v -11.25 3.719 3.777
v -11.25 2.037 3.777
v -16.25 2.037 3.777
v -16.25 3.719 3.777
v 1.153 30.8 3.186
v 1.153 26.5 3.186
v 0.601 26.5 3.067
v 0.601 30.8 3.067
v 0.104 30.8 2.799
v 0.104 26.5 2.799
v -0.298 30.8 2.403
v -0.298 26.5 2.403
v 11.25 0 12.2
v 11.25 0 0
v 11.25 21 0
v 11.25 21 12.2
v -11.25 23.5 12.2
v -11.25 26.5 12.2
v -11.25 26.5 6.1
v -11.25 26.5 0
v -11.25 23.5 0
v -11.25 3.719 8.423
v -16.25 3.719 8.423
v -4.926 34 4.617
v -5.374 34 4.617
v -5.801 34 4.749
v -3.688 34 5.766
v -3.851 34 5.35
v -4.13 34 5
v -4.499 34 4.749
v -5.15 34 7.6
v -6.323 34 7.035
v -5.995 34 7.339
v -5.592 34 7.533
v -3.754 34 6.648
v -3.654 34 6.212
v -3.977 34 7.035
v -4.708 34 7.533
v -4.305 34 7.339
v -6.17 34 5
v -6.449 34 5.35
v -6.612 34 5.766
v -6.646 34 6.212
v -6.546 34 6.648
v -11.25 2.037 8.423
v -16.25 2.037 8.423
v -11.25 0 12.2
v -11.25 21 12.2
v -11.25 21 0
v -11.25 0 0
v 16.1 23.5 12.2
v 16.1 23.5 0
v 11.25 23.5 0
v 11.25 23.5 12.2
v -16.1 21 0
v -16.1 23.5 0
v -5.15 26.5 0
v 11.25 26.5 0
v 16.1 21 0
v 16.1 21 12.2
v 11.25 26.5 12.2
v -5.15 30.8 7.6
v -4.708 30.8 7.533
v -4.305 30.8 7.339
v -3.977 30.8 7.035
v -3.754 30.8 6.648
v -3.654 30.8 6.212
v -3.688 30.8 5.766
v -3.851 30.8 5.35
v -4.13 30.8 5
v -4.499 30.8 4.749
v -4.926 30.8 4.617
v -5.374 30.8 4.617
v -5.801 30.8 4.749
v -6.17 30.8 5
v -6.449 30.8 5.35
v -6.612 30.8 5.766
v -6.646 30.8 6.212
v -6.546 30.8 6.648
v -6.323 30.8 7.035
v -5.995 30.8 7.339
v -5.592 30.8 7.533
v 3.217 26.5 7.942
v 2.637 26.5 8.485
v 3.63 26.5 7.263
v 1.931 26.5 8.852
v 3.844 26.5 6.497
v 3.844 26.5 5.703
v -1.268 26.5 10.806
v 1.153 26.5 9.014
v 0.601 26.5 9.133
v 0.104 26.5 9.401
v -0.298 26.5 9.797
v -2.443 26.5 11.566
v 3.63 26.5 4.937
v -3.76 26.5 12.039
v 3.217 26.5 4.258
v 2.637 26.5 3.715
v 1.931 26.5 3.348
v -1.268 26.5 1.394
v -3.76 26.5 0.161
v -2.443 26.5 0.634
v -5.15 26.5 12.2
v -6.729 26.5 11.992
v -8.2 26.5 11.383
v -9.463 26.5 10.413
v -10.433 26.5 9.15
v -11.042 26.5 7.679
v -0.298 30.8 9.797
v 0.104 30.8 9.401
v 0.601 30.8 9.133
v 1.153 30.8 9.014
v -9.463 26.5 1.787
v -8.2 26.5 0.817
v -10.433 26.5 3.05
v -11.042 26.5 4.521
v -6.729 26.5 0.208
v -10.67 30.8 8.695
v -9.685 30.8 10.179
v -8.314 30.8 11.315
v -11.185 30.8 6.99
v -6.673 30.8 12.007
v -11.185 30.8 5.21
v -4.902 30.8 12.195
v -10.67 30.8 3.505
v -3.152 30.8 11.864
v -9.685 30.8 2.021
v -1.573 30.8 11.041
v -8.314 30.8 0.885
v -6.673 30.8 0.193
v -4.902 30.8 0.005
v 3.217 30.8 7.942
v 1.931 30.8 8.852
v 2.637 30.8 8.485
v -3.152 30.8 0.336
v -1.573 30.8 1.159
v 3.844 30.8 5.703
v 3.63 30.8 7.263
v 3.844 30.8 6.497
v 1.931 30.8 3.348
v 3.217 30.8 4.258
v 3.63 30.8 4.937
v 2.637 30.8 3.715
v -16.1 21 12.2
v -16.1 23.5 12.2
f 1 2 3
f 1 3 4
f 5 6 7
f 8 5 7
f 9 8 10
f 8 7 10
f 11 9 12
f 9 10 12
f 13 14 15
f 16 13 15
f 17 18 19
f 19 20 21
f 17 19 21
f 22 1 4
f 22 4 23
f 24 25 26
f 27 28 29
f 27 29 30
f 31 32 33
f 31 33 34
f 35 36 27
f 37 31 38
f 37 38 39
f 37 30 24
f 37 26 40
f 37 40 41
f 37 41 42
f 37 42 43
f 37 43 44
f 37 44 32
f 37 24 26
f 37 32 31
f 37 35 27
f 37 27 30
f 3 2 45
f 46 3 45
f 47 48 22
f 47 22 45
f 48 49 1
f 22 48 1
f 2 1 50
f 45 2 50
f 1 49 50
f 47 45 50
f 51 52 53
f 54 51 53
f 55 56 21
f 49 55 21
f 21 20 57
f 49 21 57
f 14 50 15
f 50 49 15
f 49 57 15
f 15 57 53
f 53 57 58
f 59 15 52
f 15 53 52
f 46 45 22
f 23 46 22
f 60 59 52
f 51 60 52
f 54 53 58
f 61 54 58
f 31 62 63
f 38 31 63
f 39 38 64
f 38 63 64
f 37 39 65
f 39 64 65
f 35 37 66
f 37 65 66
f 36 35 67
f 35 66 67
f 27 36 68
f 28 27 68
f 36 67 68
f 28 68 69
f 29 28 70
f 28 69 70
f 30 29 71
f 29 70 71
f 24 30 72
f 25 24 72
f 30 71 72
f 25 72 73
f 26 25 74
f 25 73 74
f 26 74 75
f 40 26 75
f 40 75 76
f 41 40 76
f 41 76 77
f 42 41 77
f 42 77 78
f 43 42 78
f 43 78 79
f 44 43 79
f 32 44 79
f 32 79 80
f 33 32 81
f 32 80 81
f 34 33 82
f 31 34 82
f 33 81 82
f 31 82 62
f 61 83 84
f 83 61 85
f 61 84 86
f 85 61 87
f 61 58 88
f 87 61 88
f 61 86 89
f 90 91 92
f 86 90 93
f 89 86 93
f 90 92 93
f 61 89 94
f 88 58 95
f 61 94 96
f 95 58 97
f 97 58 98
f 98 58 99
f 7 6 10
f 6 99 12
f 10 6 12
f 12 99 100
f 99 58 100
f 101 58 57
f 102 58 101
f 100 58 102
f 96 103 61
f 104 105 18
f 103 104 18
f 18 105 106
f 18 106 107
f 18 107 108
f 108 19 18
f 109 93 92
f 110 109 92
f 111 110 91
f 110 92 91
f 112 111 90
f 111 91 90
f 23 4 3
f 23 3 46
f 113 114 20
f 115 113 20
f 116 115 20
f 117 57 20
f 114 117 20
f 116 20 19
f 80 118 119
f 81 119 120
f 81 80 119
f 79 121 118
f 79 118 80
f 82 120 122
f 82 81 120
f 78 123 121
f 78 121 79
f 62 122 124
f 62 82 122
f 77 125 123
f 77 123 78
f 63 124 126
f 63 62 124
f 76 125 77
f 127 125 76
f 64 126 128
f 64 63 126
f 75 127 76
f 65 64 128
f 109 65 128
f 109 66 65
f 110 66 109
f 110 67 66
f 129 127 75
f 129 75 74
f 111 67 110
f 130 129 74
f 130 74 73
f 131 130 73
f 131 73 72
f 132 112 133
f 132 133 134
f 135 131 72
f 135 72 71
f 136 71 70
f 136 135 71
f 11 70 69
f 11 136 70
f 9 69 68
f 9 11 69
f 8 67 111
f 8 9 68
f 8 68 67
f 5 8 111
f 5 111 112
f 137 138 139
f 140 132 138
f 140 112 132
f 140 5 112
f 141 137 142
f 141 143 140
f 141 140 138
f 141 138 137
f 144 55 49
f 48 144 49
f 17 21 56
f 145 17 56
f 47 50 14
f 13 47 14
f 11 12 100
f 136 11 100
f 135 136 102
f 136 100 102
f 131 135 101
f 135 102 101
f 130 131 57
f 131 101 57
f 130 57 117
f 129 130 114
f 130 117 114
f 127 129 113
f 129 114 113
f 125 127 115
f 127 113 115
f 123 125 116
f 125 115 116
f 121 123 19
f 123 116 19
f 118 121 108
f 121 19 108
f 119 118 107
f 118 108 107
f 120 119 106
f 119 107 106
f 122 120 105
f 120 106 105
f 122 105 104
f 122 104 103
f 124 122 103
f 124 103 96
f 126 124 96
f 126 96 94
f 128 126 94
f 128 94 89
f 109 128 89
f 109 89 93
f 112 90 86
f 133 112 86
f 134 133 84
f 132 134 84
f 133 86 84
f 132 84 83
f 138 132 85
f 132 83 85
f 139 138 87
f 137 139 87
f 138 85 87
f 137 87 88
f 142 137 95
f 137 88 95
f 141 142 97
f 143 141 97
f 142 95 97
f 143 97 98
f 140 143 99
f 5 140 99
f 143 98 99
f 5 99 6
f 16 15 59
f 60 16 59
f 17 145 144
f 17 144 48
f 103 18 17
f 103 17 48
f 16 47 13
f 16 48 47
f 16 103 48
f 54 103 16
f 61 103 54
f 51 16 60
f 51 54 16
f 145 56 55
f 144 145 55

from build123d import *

# Parameters (mm, degrees)
BOSS_EXTRUDE1_DEPTH = 12.2
BOSS_EXTRUDE2_DEPTH = 4.3
SKETCH3_R           = 1.5
BOSS_EXTRUDE3_DEPTH = 3.2
SKETCH4_W           = 4.645747774
SKETCH4_H           = 1.682483887
BOSS_EXTRUDE4_DEPTH = 5


with BuildPart() as part:
    # Sketch1 → Boss-Extrude1 (new body)
    with BuildSketch(Plane.XY):
        Polygon((-11.25, 0), (11.25, 0), (11.25, 21), (16.1, 21), (16.1, 23.5), (11.25, 23.5), (11.25, 26.5), (-11.25, 26.5), (-11.25, 23.5), (-16.1, 23.5), (-16.1, 21), (-11.25, 21), align=None)
    extrude(amount=BOSS_EXTRUDE1_DEPTH)

    # Sketch2 → Boss-Extrude2 (add)
    with BuildSketch(Plane(origin=(0, 26.5, 0), x_dir=(1, 0, 0), z_dir=(0, 1, 0))):
        with BuildLine():
            ThreePointArc((-0.298176495, -2.402729564), (-11.25, -6.1), (-0.298176495, -9.797270436))
            ThreePointArc((-0.298176495, -9.797270436), (0.343135361, -9.249221864), (1.153363413, -9.014341819))
            ThreePointArc((1.153363413, -9.014341819), (3.871428575, -6.1), (1.153363413, -3.185658181))
            ThreePointArc((1.153363413, -3.185658181), (0.343135361, -2.950778136), (-0.298176495, -2.402729564))
        make_face()
    extrude(amount=BOSS_EXTRUDE2_DEPTH)

    # Sketch3 → Boss-Extrude3 (add)
    with BuildSketch(Plane(origin=(0, 30.8, 0), x_dir=(1, 0, 0), z_dir=(0, 1, 0))):
        with Locations(Location((-5.15, -6.1, 0), (0, 0, 270))):
            Circle(SKETCH3_R)
    extrude(amount=BOSS_EXTRUDE3_DEPTH)

    # Sketch4 → Boss-Extrude4 (add)
    with BuildSketch(Plane.ZY.offset(11.25)):
        with Locations((6.1, 2.87779749)):
            Rectangle(SKETCH4_W, SKETCH4_H)
    extrude(amount=BOSS_EXTRUDE4_DEPTH)


solid = part.part
